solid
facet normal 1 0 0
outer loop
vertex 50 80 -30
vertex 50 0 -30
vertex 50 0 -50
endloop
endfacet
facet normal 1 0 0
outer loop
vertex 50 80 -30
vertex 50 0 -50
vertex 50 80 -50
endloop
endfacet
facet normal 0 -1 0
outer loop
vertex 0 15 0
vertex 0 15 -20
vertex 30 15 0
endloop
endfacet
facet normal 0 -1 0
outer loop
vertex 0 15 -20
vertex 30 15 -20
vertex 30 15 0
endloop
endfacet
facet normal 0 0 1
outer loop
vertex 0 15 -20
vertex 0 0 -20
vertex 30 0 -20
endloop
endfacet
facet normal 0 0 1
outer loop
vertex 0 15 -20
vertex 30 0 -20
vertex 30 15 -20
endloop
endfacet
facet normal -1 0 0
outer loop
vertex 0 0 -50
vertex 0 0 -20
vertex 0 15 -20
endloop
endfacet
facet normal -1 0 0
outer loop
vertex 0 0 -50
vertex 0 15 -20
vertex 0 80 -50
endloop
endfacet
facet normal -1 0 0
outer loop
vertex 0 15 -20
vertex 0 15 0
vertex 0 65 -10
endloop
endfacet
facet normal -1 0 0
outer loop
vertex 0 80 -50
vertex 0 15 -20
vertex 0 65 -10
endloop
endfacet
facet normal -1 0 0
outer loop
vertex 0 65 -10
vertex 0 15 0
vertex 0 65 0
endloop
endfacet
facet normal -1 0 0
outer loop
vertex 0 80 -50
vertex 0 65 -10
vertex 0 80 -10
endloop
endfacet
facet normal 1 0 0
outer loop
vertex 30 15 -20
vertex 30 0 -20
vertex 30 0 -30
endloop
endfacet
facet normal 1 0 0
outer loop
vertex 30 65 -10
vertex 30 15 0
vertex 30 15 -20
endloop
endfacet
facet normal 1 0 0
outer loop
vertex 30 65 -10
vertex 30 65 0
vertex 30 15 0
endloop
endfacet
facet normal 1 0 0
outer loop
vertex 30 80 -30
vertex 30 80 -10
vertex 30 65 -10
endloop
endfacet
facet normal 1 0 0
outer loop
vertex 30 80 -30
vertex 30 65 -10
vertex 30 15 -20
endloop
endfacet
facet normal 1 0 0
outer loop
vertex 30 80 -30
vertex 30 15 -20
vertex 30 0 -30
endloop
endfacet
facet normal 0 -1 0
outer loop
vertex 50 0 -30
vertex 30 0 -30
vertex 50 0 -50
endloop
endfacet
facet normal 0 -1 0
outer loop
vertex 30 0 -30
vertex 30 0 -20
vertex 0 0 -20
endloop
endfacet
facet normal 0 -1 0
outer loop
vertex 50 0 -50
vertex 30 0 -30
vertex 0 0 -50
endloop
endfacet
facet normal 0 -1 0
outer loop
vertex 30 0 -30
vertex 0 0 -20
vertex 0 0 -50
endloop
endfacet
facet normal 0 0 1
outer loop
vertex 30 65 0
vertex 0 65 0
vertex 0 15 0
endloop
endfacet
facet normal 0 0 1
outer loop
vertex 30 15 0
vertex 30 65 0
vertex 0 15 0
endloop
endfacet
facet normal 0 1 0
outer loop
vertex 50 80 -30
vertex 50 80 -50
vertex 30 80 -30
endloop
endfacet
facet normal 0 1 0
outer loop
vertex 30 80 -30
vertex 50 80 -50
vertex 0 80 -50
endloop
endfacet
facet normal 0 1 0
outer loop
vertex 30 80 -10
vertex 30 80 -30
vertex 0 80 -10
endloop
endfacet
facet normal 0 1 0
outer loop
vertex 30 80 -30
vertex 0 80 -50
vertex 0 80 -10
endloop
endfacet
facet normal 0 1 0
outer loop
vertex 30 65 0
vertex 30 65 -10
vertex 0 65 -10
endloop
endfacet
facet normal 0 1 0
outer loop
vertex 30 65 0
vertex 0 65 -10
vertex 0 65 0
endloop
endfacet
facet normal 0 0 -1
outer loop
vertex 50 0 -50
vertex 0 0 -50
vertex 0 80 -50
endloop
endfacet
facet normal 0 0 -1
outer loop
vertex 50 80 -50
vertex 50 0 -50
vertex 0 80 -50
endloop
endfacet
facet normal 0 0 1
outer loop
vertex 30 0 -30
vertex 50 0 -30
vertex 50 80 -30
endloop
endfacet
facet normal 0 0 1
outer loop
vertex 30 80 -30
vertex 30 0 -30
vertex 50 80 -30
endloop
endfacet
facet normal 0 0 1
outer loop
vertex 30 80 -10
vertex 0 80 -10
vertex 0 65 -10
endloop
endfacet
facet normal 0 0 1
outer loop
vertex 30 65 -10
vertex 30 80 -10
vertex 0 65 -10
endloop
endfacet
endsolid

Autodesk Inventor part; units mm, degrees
ref_plane "YZ Plane" through (0, 0, 0) normal (1, 0, 0) x (0, 1, 0)
ref_plane "XZ Plane" through (0, 0, 0) normal (0, 1, 0) x (-1, 0, 0)
ref_plane "XY Plane" through (0, 0, 0) normal (0, 0, 1) x (1, 0, 0)
sketch "Náčrt1" plane through (0, 0, 0) normal (1, 0, 0) x (0, 1, 0)
  line L0 (0, 0) -> (0, -50)
  line L1 (0, -50) -> (80, -50)
  line L2 (80, -50) -> (80, 0)
  line L3 (80, 0) -> (0, 0)
  dimension "d0" = 50
  dimension "d1" = 80
  dimension "d2" = 50
extrude "Vysunutí1" add sketch "Náčrt1" along normal blind 50
sketch "Náčrt2" plane through (50, 0, 0) normal (1, 0, 0) x (0, 0, -1)
  line L0 (0, 0) -> (20, 0)
  line L1 (0, 0) -> (50, 0) projected
  line L2 (20, 0) -> (20, 15)
  line L3 (20, 15) -> (0, 15)
  line L4 (0, 80) -> (0, 0) projected
  line L5 (0, 0) -> (0, 15)
  line L6 (0, 80) -> (10, 80)
  line L7 (50, 80) -> (0, 80) projected
  line L8 (10, 80) -> (10, 65)
  line L9 (10, 65) -> (0, 65)
  line L10 (0, 80) -> (0, 65)
  dimension "d5" = 20
  dimension "d6" = 15
  dimension "d7" = 10
  dimension "d8" = 15
extrude "Vysunutí2" cut sketch "Náčrt2" against normal blind 50
sketch "Náčrt3" plane through (50, 0, 0) normal (1, 0, 0) x (0, 0, -1)
  line L0 (20, 0) -> (50, 0) projected
  line L1 (50, 0) -> (30, 0)
  line L2 (30, 0) -> (30, 80)
  line L3 (50, 80) -> (10, 80) projected
  line L4 (10, 80) -> (10, 65) projected
  line L5 (30, 80) -> (10, 80)
  line L6 (10, 80) -> (10, 65)
  line L7 (10, 65) -> (0, 65) projected
  line L8 (10, 65) -> (0, 65)
  line L9 (0, 15) -> (20, 15) projected
  line L10 (0, 65) -> (0, 15)
  line L11 (0, 15) -> (20, 15)
  line L12 (20, 15) -> (20, 0) projected
  line L13 (20, 15) -> (20, 0)
  line L14 (20, 0) -> (30, 0)
  point P0 (0, 0)
  dimension "d11" = 20
extrude "Vysunutí3" cut sketch "Náčrt3" against normal blind 20
properties part number "Martin-Probst-26673_obrazek_1"
